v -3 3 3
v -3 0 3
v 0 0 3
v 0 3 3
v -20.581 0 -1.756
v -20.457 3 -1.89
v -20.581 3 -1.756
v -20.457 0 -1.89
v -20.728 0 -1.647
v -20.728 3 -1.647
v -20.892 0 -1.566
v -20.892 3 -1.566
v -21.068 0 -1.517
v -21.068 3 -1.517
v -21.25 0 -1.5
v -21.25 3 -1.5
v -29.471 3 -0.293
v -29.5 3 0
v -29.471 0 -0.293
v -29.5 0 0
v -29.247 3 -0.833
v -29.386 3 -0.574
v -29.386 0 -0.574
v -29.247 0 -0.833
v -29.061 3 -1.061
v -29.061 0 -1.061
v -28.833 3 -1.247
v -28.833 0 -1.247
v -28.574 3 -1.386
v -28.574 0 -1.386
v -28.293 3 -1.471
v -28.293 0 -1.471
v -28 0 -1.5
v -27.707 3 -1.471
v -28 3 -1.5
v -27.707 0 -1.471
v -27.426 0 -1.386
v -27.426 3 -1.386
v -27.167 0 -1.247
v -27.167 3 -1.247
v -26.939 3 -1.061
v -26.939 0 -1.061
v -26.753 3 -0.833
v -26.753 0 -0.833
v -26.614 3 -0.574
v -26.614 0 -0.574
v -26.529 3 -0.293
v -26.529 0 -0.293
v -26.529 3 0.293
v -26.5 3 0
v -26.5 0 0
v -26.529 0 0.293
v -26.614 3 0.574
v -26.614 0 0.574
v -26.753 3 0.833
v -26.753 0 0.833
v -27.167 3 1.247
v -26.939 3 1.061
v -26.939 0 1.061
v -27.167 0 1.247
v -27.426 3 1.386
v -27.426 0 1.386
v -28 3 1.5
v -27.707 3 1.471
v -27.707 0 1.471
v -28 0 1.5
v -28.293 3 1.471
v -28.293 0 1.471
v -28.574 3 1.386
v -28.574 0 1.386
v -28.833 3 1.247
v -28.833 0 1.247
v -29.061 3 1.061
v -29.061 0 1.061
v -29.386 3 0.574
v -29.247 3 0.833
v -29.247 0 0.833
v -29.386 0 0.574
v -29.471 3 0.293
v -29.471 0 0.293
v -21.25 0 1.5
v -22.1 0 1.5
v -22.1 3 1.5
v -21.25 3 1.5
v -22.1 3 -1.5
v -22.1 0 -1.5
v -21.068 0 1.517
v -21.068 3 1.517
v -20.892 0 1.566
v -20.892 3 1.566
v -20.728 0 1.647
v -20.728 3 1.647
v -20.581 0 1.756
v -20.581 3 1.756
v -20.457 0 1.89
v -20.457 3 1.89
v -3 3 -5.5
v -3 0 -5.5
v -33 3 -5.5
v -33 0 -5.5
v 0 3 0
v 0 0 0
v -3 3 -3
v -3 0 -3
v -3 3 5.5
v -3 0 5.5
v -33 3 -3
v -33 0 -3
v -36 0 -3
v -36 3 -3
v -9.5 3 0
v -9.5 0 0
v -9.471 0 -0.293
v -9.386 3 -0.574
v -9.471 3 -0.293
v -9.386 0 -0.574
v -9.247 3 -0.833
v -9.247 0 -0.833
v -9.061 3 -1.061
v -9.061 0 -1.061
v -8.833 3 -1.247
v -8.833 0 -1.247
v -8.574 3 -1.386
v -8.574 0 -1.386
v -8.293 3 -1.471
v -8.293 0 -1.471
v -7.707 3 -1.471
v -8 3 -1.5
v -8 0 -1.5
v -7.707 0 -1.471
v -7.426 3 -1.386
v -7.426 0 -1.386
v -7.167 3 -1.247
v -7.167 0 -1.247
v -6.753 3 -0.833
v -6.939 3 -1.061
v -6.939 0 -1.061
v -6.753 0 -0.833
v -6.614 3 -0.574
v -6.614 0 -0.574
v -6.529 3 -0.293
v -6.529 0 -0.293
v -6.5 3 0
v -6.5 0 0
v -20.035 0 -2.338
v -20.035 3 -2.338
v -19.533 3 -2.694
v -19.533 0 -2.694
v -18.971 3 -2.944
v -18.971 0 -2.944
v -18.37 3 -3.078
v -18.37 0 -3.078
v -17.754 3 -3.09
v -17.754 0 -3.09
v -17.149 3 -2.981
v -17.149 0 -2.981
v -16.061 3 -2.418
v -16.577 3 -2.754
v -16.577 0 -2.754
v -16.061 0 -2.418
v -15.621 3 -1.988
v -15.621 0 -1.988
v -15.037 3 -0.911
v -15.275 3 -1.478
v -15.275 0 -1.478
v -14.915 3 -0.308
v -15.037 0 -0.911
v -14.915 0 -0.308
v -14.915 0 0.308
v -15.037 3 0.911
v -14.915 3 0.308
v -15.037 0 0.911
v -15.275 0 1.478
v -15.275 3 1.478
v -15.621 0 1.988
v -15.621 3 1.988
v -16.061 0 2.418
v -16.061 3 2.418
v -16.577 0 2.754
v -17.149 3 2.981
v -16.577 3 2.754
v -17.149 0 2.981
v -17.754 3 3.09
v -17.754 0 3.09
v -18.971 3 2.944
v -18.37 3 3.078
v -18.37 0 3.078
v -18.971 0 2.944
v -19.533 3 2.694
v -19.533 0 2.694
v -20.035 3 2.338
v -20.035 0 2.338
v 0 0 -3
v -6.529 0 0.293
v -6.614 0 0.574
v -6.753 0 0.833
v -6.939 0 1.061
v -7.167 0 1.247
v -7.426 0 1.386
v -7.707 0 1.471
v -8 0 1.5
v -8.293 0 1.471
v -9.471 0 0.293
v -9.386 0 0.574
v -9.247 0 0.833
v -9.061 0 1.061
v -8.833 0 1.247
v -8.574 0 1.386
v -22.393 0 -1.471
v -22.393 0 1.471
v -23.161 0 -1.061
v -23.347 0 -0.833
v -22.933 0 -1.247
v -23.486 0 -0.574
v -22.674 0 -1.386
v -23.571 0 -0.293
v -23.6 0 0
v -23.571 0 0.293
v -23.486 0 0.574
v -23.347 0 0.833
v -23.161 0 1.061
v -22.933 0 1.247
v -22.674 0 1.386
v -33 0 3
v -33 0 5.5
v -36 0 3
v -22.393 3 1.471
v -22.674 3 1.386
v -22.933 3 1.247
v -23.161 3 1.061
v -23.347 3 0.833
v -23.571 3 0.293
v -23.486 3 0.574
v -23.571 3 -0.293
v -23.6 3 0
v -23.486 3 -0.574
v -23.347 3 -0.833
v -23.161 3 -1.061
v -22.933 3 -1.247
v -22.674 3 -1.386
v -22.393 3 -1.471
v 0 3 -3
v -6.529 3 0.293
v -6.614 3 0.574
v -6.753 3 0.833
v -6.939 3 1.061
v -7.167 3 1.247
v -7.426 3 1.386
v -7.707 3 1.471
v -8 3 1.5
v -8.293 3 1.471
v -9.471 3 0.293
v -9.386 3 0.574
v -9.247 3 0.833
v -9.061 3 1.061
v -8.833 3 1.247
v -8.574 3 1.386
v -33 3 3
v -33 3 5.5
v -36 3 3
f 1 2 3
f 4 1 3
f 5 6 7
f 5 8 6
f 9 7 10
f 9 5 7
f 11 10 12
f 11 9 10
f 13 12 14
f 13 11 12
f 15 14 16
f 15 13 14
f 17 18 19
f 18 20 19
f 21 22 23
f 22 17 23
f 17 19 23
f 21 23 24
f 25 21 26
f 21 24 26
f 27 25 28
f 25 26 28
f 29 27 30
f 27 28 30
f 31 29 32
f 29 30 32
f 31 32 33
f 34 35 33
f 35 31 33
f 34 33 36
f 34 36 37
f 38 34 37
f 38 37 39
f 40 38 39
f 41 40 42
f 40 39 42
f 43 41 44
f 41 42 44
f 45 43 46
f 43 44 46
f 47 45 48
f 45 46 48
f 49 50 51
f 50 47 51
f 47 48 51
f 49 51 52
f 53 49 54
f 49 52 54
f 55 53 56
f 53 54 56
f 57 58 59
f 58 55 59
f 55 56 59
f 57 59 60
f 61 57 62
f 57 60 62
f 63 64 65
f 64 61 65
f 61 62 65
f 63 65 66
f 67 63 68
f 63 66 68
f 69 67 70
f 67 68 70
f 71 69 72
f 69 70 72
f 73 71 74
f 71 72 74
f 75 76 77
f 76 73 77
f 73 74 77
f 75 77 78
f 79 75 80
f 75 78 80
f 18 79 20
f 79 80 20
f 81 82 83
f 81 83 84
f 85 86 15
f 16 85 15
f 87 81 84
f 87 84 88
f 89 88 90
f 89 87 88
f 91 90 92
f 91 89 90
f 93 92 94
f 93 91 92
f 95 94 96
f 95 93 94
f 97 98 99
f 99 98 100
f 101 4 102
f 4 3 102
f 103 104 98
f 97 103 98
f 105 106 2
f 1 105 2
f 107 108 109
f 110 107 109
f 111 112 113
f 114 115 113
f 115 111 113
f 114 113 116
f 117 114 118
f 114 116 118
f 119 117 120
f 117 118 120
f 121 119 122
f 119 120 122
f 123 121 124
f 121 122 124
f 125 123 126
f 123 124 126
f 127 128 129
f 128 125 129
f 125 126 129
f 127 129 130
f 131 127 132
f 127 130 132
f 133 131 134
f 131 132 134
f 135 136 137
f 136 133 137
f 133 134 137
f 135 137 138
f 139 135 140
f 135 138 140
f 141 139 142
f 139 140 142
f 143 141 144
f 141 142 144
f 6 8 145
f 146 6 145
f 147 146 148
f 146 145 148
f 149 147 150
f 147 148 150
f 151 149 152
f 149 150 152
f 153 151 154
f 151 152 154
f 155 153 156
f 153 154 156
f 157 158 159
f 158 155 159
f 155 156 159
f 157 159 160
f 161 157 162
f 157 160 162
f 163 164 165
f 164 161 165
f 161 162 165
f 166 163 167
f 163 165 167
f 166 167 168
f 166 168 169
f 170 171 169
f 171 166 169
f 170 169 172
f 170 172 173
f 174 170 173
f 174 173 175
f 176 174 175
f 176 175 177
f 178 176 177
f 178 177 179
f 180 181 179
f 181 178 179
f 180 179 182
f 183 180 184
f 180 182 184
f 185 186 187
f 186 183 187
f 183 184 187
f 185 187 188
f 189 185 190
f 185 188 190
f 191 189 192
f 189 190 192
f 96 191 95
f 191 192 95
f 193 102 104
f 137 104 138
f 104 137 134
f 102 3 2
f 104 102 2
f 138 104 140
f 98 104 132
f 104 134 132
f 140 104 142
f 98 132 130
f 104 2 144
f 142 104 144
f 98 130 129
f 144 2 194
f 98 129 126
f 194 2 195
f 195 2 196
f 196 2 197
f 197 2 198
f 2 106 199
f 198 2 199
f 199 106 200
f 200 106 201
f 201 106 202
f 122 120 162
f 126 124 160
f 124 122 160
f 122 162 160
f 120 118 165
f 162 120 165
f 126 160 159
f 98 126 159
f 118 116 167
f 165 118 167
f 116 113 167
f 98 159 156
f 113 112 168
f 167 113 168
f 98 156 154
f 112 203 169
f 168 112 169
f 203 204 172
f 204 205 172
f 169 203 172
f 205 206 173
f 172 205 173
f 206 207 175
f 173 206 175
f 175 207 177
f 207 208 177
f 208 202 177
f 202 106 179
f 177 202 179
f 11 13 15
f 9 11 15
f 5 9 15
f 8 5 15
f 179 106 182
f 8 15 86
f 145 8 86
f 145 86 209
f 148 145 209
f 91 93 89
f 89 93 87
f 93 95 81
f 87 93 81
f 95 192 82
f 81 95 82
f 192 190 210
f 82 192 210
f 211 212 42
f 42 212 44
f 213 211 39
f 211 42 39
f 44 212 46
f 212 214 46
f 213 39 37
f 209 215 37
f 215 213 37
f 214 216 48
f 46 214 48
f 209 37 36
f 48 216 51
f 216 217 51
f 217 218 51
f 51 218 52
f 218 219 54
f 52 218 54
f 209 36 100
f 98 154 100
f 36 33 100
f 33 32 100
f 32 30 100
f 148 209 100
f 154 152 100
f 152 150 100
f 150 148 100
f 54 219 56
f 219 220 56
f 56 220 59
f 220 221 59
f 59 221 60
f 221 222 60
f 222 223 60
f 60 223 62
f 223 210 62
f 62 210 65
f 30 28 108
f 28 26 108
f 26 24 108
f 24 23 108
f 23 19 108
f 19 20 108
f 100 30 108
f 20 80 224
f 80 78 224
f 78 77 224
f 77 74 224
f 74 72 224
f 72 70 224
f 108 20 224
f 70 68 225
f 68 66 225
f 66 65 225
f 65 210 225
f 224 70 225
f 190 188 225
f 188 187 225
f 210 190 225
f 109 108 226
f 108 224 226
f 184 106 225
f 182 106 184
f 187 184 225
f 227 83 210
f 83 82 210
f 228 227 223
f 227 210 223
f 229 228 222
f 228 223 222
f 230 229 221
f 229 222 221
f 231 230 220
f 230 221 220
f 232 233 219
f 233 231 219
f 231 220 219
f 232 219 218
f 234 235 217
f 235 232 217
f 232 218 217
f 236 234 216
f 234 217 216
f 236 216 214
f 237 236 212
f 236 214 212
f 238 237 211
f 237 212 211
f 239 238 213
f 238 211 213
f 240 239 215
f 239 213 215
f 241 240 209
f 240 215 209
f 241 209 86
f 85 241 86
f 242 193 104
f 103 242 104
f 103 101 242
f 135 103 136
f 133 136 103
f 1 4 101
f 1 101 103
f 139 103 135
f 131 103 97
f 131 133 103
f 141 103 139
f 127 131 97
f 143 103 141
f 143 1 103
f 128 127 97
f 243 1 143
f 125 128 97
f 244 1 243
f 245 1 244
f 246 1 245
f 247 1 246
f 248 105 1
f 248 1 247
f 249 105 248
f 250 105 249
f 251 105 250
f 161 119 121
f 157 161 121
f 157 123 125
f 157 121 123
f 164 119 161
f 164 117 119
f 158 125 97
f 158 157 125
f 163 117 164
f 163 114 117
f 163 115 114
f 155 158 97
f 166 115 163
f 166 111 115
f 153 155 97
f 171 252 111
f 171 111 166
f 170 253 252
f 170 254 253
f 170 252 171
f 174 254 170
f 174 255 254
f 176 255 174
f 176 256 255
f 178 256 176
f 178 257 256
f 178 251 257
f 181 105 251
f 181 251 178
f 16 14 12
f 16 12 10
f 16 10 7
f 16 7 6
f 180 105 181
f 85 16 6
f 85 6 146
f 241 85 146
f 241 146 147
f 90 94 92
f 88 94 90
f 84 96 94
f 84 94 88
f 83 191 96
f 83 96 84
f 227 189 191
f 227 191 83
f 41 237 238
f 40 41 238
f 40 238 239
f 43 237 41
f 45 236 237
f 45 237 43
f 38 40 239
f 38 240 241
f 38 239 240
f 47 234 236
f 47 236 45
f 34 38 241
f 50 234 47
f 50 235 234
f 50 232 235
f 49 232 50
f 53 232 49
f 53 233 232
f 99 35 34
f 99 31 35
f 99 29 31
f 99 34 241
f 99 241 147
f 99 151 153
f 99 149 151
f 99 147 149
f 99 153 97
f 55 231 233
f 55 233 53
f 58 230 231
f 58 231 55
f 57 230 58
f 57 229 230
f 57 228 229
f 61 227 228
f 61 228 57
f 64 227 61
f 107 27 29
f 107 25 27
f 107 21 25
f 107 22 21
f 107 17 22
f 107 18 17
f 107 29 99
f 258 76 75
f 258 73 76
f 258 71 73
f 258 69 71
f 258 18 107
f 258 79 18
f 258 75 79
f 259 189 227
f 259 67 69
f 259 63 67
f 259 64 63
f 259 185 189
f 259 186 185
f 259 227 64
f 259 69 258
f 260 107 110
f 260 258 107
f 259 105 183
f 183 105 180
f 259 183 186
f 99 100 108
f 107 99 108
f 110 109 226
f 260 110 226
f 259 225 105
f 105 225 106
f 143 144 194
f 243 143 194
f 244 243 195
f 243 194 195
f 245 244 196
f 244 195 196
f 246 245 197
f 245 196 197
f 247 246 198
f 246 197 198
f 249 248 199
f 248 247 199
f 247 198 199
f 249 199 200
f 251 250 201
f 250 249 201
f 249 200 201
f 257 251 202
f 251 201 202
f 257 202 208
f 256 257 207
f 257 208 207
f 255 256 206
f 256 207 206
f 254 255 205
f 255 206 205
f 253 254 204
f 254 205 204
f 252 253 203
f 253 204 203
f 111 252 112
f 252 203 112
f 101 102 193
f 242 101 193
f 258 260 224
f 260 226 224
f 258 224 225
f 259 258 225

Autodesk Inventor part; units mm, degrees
ref_plane "YZ Plane" through (0, 0, 0) normal (1, 0, 0) x (0, 1, 0)
ref_plane "XZ Plane" through (0, 0, 0) normal (0, 1, 0) x (-1, 0, 0)
ref_plane "XY Plane" through (0, 0, 0) normal (0, 0, 1) x (1, 0, 0)
sketch "Sketch1" plane through (0, 0, 0) normal (0, 1, 0) x (-1, 0, 0)
  line L0 (0, 0) -> (0, -3)
  line L1 (0, -3) -> (3, -3)
  line L2 (3, -3) -> (3, -5.5)
  line L3 (3, -5.5) -> (33, -5.5)
  line L4 (33, -5.5) -> (33, -3)
  line L5 (33, -3) -> (36, -3)
  line L6 (36, -3) -> (36, 3)
  line L7 (36, 3) -> (33, 3)
  line L8 (33, 3) -> (33, 5.5)
  line L9 (33, 5.5) -> (3, 5.5)
  line L10 (3, 5.5) -> (3, 3)
  line L11 (3, 3) -> (0, 3)
  line L12 (0, 3) -> (0, 0)
  circle A0 centre (28, 0) radius 1.5
  line L13 (0, 0) -> (8, 0)
  circle A1 centre (8, 0) radius 1.5
  line L14 (22.1, 1.5) -> (21.2496, 1.5)
  line L15 (22.1, -1.5) -> (21.2496, -1.5)
  arc A2 (22.1, -1.5) -> (22.1, 1.5) centre (22.1, 0) ccw
  arc A3 (20.457, 1.8902) -> (20.457, -1.8902) centre (18, 0) ccw
  arc A4 (20.457, 1.8902) -> (21.2496, 1.5) centre (21.2496, 2.5) ccw
  arc A5 (21.2496, -1.5) -> (20.457, -1.8902) centre (21.2496, -2.5) ccw
  point P0 (20.7129, 1.5)
  point P1 (20.7129, -1.5)
  dimension "d15" = 3
  dimension "d16" = 3
  dimension "d17" = 2.5
  dimension "d18" = 30
  dimension "d19" = 3
  dimension "d20" = 6
  dimension "d21" = 2.5
  dimension "d22" = 30
  dimension "d25" = 3
  dimension "d26" = 8
  dimension "d27" = 3
  dimension "d30" = 1
  dimension "d31" = 8
  dimension "d32" = 11
  dimension "d33" = 20
extrude "Extrusion1" add sketch "Sketch1" along normal blind 3
properties part number "Laser Mount Plate" material "Polycarbonate, Smoke"
